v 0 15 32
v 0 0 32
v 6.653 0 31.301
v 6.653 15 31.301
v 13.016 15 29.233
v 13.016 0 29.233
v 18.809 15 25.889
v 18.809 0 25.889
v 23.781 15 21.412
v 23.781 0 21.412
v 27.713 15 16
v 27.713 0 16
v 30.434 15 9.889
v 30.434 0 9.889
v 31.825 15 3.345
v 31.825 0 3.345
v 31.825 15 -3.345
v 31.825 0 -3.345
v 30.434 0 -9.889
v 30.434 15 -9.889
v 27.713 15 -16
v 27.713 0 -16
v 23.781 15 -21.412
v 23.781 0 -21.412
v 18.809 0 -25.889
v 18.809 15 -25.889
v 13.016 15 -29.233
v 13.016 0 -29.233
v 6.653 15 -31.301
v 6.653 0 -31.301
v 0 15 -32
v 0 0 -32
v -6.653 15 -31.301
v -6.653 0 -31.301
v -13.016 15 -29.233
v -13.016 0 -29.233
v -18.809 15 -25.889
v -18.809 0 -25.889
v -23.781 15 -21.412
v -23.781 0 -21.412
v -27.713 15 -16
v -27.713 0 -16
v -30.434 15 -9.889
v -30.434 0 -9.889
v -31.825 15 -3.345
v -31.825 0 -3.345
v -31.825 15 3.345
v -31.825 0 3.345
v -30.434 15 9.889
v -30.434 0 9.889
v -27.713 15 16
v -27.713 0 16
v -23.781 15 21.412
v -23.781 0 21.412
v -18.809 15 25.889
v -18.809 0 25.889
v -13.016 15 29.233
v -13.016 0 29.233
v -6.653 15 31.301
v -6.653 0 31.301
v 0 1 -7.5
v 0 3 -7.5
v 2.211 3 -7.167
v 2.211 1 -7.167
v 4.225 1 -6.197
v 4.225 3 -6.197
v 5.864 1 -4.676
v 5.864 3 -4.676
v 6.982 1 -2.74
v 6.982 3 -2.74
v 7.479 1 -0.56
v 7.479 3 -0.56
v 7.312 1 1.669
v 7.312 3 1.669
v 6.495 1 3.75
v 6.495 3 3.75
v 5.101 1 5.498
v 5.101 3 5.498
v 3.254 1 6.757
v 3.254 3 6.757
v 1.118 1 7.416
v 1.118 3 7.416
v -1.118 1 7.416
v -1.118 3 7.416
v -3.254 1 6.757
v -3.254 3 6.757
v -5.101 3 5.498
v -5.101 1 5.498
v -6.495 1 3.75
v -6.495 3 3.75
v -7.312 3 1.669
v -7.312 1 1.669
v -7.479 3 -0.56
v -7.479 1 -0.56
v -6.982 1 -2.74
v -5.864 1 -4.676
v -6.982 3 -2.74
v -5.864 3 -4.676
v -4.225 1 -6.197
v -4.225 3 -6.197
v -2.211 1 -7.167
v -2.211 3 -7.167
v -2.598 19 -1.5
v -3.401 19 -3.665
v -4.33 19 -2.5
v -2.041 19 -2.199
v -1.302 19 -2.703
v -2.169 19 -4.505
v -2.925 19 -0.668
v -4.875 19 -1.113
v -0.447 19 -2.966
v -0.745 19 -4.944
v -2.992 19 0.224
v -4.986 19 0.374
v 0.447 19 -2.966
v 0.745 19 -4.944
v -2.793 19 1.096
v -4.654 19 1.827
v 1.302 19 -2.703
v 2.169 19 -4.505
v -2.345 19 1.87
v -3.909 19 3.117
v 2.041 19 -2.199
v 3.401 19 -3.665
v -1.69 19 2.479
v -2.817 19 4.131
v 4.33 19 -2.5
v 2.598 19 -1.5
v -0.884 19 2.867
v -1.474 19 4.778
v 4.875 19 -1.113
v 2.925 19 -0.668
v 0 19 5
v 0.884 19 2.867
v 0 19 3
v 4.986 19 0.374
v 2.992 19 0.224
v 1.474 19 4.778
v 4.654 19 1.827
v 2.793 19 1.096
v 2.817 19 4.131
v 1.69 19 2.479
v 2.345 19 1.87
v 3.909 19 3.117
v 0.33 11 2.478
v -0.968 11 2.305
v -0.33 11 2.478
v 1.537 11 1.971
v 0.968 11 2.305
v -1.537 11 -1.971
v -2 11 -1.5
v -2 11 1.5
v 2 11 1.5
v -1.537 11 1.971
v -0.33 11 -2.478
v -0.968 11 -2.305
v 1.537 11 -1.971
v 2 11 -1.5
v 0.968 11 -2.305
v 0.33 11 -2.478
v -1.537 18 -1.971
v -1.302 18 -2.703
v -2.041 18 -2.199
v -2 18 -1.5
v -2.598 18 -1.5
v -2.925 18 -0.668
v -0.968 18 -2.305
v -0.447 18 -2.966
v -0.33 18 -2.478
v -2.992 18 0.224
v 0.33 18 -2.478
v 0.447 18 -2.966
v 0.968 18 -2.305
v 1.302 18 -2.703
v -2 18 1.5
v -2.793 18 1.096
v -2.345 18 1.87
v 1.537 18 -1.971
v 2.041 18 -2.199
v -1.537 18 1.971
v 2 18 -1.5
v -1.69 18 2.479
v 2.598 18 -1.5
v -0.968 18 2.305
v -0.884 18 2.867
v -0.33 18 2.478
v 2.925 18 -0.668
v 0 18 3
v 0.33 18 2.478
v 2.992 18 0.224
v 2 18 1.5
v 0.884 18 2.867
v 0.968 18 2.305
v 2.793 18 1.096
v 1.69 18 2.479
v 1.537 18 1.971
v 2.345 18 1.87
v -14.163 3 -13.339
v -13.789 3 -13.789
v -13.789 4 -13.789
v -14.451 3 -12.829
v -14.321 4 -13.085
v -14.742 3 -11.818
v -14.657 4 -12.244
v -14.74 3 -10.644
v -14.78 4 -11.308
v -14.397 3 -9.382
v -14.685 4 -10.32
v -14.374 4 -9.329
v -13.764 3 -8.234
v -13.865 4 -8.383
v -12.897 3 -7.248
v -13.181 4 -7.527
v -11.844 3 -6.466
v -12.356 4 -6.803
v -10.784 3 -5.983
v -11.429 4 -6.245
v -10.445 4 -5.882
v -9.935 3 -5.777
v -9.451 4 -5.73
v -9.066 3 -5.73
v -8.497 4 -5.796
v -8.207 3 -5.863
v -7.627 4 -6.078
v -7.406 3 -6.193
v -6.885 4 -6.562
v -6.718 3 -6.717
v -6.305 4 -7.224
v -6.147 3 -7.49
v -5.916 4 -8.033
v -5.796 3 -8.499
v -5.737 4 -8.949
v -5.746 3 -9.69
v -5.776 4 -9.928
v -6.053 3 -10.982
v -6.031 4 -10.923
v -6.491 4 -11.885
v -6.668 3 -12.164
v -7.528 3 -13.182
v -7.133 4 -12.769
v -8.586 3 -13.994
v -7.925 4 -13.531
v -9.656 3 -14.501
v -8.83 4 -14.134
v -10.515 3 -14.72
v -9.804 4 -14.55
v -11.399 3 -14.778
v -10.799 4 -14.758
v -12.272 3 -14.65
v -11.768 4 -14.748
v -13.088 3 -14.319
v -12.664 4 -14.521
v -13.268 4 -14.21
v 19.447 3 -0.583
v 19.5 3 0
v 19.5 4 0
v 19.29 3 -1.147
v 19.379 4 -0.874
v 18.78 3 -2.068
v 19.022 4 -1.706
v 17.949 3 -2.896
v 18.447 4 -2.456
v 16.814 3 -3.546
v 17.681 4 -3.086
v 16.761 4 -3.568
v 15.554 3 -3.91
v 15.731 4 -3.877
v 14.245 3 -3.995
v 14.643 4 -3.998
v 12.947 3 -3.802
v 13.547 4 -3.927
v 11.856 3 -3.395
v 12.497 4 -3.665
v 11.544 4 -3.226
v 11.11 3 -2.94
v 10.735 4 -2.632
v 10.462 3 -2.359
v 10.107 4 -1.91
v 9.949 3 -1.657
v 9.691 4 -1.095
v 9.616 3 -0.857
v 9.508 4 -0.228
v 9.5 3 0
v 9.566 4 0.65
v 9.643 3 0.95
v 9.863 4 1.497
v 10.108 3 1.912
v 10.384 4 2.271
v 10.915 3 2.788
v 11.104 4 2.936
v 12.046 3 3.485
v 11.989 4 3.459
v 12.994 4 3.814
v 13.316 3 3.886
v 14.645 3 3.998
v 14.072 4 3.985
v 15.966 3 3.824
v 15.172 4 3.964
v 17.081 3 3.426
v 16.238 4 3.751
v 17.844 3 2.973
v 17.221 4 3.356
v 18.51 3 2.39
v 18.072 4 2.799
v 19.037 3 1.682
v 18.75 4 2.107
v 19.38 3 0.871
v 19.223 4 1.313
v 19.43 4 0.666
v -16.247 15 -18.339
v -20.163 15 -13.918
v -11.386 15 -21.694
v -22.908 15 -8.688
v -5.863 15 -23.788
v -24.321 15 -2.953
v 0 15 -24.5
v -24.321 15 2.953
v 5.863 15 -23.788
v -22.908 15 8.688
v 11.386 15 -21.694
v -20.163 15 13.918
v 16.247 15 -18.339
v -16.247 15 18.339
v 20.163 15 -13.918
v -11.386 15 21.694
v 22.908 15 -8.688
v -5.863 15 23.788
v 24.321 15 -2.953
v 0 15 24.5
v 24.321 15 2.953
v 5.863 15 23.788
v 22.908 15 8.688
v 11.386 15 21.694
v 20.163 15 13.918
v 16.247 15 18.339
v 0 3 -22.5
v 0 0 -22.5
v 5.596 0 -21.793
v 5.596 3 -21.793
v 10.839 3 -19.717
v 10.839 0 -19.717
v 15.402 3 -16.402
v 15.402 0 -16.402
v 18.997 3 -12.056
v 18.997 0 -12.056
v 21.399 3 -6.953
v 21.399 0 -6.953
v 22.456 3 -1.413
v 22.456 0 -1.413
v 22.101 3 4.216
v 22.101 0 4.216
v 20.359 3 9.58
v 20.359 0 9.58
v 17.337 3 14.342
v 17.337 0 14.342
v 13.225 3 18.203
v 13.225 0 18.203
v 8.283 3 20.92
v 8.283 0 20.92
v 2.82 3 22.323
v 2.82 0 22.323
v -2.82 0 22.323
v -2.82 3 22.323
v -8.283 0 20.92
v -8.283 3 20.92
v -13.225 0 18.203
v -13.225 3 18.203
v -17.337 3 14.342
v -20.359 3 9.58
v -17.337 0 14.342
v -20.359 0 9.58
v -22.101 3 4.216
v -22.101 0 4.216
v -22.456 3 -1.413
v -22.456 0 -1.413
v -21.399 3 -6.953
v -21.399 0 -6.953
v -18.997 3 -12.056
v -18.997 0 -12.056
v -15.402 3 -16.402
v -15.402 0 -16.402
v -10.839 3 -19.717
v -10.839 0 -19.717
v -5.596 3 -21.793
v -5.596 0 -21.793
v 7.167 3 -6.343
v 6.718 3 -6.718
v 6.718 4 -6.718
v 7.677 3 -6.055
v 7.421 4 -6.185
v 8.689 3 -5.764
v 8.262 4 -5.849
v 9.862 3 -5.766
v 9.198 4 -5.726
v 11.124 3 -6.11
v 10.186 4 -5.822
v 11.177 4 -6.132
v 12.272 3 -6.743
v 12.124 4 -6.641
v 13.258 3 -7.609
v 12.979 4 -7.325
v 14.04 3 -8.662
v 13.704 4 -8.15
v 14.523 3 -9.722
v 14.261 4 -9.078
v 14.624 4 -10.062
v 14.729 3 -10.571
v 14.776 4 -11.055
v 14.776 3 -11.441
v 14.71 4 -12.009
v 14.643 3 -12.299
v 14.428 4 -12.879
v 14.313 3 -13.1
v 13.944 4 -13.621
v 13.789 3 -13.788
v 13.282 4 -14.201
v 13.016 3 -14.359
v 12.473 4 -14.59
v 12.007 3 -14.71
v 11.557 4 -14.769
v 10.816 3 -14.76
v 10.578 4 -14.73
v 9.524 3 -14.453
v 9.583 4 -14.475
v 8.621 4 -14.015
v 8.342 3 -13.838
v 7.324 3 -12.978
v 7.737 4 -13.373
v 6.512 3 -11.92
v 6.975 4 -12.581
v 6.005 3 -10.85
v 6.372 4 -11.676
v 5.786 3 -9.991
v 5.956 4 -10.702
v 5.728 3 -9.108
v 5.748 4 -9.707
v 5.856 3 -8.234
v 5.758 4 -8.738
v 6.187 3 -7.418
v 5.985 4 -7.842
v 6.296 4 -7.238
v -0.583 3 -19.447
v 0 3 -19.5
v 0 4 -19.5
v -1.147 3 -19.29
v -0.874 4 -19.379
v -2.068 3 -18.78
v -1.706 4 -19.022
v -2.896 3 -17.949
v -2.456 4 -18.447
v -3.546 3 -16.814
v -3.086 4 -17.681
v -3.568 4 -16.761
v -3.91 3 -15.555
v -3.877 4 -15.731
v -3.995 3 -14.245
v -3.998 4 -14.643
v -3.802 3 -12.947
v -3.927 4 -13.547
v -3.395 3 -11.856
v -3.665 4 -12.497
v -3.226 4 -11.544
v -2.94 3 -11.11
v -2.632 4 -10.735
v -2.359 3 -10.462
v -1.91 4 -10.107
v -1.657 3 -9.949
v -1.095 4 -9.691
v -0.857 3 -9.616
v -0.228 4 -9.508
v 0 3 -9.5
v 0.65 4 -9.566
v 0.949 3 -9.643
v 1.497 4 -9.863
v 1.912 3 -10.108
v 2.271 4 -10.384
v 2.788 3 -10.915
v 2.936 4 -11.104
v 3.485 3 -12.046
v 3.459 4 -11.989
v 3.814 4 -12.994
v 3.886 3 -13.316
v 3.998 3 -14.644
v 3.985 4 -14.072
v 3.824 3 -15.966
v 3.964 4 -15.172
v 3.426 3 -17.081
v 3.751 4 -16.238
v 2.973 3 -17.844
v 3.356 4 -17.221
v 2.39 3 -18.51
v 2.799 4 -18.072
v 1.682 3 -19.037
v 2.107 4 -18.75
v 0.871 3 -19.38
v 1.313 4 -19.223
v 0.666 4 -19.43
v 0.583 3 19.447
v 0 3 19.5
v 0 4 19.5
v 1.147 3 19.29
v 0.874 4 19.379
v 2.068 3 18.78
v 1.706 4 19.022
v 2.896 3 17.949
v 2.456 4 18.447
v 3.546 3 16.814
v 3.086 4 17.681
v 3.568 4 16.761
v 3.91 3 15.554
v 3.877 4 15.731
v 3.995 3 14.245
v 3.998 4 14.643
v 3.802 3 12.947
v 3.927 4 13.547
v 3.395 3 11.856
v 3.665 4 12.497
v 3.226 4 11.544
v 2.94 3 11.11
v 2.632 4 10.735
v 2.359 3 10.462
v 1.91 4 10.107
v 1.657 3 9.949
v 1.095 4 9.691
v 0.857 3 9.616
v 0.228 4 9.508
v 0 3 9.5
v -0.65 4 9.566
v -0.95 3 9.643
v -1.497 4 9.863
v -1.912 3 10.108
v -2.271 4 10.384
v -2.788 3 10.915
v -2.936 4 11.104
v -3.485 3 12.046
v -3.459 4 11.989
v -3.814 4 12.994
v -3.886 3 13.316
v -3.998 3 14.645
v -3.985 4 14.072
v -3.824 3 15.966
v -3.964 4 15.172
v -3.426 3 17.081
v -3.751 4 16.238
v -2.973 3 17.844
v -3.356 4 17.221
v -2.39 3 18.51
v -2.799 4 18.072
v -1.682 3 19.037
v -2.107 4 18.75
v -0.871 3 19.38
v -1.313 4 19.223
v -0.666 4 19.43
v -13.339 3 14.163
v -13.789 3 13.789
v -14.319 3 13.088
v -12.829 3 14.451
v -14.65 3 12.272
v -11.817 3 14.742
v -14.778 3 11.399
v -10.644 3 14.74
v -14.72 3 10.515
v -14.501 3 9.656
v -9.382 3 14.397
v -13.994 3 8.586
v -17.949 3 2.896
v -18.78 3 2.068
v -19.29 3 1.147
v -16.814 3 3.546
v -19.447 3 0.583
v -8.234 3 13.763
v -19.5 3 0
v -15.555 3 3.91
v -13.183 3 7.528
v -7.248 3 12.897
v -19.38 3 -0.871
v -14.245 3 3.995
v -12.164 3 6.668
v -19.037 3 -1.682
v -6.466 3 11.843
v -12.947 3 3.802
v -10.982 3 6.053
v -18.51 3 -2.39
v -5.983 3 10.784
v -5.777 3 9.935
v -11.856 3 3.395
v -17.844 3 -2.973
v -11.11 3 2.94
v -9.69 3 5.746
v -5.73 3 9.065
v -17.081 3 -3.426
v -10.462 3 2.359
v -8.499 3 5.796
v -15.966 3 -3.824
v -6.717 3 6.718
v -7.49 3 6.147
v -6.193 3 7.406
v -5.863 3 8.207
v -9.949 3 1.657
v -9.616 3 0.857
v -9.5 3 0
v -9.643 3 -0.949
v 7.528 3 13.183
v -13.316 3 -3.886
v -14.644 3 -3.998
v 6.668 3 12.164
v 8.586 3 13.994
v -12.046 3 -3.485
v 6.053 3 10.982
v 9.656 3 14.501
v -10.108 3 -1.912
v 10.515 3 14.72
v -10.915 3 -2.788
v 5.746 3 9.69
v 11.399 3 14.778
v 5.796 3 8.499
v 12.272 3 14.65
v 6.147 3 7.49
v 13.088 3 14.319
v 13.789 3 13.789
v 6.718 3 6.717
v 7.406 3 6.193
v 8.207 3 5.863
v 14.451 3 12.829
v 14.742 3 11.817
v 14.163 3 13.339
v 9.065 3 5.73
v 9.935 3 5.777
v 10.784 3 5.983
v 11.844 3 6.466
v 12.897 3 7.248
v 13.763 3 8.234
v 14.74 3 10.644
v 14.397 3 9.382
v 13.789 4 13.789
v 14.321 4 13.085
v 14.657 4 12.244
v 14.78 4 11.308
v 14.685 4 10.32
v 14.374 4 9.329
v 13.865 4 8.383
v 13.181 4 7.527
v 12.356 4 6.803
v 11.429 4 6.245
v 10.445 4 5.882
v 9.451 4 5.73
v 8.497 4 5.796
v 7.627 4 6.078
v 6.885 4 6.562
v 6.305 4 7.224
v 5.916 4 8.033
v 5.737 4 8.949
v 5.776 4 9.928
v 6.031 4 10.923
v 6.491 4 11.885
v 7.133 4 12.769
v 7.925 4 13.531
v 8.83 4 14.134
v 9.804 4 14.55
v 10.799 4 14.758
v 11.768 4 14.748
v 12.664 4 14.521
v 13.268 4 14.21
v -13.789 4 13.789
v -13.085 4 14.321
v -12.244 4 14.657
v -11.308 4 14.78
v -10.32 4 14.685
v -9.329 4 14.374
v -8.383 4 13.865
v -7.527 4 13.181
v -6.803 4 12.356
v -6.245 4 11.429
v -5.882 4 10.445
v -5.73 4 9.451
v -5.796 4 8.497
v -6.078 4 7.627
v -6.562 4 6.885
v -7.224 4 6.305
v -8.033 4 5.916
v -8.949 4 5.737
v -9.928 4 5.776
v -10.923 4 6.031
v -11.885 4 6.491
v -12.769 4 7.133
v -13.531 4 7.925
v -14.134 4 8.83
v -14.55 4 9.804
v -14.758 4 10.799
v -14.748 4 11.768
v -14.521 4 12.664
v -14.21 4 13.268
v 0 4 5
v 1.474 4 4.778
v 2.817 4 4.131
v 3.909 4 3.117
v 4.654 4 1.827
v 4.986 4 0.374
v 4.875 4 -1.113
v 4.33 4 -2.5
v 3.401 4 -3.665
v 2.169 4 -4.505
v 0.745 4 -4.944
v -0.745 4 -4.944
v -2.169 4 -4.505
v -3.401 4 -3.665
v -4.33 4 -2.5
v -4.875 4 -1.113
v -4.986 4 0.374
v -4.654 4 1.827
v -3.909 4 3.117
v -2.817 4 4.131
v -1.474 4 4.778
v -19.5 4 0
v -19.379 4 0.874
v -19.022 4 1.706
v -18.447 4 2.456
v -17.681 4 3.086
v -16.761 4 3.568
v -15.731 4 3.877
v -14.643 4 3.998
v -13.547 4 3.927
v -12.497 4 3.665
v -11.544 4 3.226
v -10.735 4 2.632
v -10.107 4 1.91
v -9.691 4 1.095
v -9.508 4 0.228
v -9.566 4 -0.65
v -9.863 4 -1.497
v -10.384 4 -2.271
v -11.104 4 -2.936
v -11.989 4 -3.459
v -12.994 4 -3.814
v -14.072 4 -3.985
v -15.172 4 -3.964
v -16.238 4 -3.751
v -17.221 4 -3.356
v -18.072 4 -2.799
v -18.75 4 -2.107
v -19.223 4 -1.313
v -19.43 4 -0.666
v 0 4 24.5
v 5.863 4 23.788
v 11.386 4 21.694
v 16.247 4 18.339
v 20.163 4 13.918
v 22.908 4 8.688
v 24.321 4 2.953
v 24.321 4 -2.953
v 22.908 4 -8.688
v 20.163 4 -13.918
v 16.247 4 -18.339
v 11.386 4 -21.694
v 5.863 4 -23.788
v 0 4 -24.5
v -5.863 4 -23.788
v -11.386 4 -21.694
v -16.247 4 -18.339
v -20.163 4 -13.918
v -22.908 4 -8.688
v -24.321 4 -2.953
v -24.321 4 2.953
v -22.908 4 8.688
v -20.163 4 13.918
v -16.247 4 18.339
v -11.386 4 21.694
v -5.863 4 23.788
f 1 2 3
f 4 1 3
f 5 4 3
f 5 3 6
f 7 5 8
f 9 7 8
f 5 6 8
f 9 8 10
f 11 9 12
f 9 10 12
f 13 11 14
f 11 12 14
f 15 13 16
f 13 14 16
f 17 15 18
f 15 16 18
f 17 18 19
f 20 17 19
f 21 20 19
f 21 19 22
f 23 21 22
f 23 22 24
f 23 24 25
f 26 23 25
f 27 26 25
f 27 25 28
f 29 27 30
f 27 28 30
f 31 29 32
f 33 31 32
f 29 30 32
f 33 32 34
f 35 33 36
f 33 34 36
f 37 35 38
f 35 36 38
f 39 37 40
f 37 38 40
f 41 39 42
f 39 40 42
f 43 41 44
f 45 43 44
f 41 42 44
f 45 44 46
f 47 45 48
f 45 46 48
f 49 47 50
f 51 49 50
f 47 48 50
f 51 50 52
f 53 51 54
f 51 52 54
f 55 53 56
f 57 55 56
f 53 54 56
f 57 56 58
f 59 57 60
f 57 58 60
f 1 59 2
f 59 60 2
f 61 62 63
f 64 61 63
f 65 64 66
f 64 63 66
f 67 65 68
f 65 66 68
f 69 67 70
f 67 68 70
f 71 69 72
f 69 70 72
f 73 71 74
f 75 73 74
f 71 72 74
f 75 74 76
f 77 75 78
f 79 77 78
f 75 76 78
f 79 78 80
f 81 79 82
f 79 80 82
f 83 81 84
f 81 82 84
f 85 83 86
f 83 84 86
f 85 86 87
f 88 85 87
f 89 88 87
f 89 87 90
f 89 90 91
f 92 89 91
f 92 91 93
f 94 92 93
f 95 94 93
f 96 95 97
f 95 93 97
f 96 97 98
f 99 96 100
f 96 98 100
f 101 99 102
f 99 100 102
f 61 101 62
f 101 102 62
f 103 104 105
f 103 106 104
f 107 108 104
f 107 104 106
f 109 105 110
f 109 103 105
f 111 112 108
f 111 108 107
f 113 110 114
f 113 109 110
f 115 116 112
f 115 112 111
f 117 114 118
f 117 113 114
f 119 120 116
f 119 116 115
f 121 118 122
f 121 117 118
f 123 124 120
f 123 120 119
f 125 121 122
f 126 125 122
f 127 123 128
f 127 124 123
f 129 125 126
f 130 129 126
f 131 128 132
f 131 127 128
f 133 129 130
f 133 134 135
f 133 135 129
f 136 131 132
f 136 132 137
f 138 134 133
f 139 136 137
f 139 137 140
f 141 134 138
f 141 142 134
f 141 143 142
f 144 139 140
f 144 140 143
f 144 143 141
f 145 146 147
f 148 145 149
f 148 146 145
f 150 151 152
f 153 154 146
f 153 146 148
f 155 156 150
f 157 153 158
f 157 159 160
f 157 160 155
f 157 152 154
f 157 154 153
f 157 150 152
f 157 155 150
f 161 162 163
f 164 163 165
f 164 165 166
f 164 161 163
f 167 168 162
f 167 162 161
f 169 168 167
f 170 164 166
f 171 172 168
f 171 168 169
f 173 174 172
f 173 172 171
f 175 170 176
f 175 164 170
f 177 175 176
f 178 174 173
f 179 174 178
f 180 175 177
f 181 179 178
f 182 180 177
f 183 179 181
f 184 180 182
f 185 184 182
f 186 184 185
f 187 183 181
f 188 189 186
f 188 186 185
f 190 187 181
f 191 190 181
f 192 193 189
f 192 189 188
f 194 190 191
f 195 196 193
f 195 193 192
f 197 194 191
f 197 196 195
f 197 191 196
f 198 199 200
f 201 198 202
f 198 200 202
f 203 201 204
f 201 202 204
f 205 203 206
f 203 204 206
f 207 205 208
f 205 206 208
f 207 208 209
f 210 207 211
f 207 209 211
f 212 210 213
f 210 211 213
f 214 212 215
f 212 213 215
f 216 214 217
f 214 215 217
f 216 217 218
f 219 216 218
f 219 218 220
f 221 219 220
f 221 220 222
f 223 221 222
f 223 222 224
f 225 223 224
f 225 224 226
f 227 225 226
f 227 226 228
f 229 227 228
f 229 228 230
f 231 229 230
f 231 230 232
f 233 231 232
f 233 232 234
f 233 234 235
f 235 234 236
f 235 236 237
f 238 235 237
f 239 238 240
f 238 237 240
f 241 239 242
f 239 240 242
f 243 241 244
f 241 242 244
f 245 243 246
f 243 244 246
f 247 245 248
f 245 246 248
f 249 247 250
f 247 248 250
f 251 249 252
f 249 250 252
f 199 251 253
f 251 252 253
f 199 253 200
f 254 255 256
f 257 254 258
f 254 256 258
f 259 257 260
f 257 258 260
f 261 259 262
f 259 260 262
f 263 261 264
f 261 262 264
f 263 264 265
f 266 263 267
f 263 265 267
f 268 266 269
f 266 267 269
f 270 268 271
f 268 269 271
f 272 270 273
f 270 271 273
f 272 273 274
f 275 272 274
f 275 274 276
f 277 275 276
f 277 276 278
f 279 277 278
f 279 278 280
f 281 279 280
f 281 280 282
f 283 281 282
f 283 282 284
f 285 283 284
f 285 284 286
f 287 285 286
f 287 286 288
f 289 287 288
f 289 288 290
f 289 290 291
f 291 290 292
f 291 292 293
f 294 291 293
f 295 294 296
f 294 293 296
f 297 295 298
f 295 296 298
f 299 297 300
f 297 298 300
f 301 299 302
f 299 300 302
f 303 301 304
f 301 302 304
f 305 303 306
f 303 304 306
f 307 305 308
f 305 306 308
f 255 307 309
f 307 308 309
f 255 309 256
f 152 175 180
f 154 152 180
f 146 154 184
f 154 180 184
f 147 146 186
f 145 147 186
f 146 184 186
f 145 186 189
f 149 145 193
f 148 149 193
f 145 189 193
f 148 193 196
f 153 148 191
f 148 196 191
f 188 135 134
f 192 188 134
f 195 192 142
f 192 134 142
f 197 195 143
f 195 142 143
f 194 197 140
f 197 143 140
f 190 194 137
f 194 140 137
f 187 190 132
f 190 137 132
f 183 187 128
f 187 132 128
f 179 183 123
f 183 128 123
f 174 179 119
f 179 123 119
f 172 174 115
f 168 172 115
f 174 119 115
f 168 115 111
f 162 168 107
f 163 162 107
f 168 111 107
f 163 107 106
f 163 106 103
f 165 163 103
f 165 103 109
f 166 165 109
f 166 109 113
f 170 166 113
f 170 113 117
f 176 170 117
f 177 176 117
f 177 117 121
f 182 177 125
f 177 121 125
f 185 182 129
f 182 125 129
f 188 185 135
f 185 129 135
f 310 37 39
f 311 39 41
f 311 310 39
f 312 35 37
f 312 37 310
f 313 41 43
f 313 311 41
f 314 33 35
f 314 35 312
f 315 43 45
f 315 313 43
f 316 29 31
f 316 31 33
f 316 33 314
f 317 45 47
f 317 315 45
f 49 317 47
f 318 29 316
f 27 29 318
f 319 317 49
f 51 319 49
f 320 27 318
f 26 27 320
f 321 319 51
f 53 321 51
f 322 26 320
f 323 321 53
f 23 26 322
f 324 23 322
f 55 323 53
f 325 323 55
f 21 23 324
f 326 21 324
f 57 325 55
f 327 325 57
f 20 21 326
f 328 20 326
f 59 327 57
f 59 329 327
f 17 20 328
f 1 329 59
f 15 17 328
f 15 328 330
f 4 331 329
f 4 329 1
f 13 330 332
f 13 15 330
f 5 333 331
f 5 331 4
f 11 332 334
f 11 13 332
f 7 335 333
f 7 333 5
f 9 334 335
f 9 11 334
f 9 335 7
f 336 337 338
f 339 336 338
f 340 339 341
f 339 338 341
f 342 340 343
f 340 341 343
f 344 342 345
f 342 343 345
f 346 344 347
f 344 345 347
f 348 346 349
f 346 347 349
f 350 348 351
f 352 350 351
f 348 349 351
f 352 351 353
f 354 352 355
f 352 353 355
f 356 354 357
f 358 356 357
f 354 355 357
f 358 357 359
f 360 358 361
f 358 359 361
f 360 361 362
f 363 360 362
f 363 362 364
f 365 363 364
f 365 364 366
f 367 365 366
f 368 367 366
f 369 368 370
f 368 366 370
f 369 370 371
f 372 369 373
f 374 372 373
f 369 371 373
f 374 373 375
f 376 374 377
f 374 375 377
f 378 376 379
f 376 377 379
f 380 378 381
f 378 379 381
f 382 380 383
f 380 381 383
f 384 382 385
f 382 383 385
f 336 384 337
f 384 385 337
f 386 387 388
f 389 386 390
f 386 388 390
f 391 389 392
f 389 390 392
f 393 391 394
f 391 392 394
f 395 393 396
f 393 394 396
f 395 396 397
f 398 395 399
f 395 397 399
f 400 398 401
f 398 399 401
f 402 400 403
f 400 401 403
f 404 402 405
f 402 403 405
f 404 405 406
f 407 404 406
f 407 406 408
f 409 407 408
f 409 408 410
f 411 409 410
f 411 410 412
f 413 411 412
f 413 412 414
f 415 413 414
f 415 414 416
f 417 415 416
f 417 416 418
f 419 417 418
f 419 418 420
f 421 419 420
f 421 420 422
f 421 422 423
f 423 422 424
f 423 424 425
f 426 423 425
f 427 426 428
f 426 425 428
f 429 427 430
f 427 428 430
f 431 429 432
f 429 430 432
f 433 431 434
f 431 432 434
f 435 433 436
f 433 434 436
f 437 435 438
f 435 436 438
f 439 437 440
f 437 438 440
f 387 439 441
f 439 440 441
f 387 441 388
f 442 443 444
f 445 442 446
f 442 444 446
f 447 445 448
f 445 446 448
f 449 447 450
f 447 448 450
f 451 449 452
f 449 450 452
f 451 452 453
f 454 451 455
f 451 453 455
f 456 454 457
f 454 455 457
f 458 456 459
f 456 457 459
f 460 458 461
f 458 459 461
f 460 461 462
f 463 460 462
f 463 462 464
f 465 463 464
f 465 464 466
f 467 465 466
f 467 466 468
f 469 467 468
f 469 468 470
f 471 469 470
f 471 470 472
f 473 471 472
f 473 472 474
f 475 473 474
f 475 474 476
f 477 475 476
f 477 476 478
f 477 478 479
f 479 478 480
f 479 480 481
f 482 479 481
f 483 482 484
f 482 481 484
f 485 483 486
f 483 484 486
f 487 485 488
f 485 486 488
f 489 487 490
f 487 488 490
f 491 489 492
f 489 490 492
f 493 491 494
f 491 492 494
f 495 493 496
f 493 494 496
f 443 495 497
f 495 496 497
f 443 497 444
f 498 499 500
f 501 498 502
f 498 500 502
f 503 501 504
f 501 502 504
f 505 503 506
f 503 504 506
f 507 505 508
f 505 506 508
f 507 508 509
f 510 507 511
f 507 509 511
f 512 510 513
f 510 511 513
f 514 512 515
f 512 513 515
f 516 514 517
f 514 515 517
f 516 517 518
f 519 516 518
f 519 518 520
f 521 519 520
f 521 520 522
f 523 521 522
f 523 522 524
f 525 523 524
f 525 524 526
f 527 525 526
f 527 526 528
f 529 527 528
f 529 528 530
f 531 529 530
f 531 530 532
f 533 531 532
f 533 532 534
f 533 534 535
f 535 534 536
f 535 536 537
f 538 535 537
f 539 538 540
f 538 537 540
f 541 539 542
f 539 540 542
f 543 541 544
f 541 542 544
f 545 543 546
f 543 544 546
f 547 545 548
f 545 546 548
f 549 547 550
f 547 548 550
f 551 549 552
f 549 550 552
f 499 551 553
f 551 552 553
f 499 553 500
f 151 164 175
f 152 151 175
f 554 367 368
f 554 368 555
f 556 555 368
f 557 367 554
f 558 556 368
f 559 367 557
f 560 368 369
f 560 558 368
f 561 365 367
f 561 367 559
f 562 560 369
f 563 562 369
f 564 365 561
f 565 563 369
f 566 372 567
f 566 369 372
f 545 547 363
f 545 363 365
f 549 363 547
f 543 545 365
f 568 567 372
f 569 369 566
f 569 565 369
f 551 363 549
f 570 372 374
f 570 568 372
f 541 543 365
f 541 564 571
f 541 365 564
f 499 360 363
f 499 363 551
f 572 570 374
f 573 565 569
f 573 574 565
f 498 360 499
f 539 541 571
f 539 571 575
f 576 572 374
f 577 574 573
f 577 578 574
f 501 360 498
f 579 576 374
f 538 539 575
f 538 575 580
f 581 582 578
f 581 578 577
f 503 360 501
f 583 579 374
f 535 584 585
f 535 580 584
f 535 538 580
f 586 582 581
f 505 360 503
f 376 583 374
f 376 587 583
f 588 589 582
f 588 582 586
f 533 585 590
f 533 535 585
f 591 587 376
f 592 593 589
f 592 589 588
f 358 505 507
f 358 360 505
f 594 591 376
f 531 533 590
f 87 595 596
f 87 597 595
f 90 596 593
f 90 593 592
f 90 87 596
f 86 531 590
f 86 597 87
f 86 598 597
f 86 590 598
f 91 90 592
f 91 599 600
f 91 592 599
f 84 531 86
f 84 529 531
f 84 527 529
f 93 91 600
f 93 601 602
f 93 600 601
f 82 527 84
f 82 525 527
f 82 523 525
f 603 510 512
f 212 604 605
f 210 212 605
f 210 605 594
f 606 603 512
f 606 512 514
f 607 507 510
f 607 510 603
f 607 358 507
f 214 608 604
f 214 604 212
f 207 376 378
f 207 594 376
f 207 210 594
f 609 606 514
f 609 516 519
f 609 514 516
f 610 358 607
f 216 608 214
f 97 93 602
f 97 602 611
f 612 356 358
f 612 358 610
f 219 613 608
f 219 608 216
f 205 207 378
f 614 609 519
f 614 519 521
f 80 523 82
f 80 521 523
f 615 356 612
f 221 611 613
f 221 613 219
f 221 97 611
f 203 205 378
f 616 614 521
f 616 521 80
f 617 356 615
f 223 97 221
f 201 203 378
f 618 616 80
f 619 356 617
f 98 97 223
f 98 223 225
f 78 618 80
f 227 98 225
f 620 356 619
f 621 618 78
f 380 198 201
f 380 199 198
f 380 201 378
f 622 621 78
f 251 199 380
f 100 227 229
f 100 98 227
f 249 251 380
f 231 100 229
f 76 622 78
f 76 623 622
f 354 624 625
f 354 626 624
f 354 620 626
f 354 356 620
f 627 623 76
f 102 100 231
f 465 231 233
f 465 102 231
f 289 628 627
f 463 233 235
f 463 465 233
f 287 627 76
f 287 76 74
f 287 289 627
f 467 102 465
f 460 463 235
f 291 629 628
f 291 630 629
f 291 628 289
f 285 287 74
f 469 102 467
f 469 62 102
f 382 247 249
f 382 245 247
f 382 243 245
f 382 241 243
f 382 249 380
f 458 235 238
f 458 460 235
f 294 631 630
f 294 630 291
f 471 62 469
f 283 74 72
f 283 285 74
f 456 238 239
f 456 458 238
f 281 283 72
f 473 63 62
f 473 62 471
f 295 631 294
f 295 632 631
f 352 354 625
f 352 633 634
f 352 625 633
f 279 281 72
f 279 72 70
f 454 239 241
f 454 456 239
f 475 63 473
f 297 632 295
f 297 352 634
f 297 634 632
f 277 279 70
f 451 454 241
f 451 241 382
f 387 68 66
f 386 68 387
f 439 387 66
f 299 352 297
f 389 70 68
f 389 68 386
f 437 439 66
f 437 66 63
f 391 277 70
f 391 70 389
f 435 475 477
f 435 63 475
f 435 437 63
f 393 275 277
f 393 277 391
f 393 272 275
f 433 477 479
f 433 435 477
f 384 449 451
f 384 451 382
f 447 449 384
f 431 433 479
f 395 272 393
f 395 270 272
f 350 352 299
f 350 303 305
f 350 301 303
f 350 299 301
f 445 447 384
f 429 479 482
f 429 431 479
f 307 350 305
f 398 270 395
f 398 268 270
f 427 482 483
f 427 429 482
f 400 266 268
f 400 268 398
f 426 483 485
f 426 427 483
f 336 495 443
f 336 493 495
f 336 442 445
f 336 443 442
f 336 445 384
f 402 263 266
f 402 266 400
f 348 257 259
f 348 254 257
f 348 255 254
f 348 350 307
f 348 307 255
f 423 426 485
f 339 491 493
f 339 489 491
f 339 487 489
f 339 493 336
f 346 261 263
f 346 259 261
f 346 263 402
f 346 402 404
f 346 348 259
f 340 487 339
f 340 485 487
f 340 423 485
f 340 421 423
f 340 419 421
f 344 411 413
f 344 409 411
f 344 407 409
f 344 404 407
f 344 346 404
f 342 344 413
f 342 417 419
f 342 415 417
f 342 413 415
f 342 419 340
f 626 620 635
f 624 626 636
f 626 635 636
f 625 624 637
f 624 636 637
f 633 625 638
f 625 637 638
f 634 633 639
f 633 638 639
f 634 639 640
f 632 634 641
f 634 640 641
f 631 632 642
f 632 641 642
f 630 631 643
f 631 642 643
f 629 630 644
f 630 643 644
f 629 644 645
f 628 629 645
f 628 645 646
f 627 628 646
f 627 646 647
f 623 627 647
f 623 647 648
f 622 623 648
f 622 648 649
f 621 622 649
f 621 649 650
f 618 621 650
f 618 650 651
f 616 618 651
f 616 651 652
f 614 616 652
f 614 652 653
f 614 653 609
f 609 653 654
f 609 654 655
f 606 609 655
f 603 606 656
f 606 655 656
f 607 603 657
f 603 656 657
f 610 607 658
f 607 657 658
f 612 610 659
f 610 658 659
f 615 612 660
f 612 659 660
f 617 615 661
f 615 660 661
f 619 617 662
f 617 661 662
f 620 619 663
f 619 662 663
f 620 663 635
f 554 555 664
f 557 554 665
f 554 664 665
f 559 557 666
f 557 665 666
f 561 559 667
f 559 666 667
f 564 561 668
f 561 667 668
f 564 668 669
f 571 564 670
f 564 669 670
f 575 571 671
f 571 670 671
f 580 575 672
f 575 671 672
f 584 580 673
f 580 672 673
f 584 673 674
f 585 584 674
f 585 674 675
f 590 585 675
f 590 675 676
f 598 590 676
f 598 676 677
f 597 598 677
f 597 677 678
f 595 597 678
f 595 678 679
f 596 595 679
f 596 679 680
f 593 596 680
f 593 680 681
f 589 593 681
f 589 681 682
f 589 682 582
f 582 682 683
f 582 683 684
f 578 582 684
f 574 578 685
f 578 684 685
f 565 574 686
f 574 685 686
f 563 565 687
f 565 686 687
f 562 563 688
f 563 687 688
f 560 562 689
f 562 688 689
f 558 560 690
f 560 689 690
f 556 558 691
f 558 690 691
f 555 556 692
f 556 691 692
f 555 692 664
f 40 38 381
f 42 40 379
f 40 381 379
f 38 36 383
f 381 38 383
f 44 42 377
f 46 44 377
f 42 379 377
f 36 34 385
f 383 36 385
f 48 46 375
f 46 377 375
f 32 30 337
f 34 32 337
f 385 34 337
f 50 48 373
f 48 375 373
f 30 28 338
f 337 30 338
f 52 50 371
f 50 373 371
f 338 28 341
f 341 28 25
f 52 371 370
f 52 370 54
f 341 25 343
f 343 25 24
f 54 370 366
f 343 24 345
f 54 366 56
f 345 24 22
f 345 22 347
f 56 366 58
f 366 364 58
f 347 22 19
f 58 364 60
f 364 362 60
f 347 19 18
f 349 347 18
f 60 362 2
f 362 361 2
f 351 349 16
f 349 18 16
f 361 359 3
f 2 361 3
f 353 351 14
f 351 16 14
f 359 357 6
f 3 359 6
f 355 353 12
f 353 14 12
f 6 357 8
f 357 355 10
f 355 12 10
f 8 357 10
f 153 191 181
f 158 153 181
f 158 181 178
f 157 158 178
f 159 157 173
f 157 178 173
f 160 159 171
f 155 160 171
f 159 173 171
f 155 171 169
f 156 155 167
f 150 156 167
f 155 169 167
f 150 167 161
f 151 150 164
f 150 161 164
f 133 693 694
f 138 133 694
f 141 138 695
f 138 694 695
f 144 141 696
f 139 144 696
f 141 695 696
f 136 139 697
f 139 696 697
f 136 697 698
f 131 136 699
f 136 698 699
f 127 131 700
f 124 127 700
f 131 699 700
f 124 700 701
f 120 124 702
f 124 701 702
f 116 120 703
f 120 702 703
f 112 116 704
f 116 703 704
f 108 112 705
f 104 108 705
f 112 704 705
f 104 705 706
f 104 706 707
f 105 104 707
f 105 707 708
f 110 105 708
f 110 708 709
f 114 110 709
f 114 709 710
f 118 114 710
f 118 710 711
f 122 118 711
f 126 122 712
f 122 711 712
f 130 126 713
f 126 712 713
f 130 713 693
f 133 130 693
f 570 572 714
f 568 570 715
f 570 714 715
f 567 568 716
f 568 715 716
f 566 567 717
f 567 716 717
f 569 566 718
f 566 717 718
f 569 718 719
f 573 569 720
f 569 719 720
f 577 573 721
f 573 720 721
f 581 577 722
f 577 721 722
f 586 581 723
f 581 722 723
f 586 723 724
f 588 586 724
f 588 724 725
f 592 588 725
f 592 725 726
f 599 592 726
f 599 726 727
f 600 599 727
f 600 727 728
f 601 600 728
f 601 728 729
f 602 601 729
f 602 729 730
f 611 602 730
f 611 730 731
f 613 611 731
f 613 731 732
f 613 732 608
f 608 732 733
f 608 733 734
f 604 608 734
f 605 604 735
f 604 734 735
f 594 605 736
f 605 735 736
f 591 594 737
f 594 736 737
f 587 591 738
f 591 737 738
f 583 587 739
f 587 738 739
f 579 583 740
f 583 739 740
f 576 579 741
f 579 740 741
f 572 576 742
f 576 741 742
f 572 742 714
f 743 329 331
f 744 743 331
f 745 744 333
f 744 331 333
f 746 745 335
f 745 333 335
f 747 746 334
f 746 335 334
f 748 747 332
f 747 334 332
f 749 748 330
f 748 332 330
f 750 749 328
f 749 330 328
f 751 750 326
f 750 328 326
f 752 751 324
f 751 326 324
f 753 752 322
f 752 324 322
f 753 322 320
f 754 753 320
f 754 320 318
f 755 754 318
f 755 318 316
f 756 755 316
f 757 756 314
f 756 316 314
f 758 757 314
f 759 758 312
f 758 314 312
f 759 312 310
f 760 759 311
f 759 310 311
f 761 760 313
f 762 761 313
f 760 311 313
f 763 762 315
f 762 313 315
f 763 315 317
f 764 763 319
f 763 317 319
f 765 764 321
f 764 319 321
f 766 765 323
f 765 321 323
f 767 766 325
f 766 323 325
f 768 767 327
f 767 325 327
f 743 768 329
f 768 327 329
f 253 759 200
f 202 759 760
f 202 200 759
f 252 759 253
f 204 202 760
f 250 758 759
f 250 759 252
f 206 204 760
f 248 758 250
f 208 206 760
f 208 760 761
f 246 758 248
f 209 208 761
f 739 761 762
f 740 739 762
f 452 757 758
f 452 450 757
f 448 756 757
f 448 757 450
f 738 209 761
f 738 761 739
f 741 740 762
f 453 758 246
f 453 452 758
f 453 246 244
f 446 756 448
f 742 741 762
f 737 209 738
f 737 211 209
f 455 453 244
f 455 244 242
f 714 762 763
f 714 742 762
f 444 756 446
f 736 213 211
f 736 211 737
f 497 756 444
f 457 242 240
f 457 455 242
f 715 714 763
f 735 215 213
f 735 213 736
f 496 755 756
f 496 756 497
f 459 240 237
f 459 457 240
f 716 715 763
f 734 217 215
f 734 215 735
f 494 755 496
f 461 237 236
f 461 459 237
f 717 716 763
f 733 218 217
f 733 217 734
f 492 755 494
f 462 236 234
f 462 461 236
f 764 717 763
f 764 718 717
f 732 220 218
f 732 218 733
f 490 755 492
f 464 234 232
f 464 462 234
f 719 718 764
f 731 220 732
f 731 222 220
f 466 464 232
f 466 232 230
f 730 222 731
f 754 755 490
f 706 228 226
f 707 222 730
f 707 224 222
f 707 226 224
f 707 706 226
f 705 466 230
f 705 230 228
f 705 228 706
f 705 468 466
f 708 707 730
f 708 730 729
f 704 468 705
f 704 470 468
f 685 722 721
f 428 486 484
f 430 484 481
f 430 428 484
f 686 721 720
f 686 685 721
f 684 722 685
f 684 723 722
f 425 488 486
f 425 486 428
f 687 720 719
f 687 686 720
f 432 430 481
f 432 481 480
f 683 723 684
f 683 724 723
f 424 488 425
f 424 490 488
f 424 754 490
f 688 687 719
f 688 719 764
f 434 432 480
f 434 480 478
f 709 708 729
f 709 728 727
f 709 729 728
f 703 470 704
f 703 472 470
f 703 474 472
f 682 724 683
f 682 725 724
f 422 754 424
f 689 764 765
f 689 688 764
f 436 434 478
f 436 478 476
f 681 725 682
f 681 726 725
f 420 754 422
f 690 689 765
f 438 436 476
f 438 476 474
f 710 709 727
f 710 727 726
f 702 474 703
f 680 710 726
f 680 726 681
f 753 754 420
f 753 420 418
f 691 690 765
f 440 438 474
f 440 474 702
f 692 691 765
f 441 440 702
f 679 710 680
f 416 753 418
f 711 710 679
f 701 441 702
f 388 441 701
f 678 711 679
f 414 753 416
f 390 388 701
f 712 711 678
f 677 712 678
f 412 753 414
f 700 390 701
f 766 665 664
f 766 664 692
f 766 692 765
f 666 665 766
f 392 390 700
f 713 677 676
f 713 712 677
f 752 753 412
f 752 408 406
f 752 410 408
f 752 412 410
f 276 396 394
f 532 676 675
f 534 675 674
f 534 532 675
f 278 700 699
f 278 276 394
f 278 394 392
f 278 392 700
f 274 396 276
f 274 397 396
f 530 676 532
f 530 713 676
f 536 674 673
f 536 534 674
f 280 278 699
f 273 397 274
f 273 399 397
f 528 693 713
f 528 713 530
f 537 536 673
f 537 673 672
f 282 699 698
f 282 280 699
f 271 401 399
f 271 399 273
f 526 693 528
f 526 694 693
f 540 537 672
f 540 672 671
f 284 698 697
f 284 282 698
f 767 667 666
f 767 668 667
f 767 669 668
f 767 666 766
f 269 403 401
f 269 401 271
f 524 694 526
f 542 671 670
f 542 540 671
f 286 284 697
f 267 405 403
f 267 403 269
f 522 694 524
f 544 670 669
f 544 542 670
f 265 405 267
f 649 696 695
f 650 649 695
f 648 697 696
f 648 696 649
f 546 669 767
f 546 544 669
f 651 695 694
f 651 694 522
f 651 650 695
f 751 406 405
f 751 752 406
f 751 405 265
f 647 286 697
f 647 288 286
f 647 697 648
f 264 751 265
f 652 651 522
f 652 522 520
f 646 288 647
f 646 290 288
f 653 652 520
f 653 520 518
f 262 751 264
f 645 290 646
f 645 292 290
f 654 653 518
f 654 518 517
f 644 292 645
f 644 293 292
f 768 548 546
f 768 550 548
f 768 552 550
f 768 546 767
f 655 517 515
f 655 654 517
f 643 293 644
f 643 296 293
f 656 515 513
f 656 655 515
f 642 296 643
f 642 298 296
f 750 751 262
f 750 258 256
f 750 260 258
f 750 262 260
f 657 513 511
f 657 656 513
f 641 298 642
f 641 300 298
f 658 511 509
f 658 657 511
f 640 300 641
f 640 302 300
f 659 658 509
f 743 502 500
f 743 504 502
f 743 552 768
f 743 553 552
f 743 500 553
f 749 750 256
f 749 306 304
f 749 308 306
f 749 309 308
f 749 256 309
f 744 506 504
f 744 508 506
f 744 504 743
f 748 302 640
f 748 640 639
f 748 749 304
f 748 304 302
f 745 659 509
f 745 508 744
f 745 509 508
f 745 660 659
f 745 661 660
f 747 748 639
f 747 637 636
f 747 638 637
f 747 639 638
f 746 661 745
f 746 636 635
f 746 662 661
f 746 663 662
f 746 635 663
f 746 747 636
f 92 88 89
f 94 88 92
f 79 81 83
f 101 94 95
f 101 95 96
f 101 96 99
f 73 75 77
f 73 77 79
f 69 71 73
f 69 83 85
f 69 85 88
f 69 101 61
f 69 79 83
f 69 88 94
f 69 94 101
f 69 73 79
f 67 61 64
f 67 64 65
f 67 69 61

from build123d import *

# Parameters (mm, degrees)
SKETCH1_R           = 32
BOSS_EXTRUDE1_DEPTH = 15
SKETCH2_R           = 22.5
CUT_EXTRUDE1_DEPTH  = 3
SKETCH3_R           = 7.5
BOSS_EXTRUDE2_DEPTH = 2
SKETCH4_R           = 24.5
CUT_EXTRUDE2_DEPTH  = 11
SKETCH5_R           = 5
BOSS_EXTRUDE3_DEPTH = 15
SKETCH6_RX          = 5
SKETCH6_RY          = 4
CUT_EXTRUDE3_DEPTH  = 48.675989764
SKETCH7_R           = 3
CUT_EXTRUDE4_DEPTH  = 1
CUT_EXTRUDE5_DEPTH  = 7


with BuildPart() as part:
    # Sketch1 → Boss-Extrude1 (new body)
    with BuildSketch(Plane(origin=(0, 0, 0), x_dir=(1, 0, 0), z_dir=(0, 1, 0))):
        with Locations(Location((0, 0, 0), (0, 0, 270))):
            Circle(SKETCH1_R)
    extrude(amount=BOSS_EXTRUDE1_DEPTH)

    # Sketch2 → Cut-Extrude1 (cut)
    with BuildSketch(Plane.XZ):
        with Locations(Location((0, 0, 0), (0, 0, 270))):
            Circle(SKETCH2_R)
    extrude(amount=-CUT_EXTRUDE1_DEPTH, mode=Mode.SUBTRACT)

    # Sketch3 → Boss-Extrude2 (add)
    with BuildSketch(Plane.XZ.offset(-3)):
        with Locations(Location((0, 0, 0), (0, 0, 270))):
            Circle(SKETCH3_R)
    extrude(amount=BOSS_EXTRUDE2_DEPTH)

    # Sketch4 → Cut-Extrude2 (cut)
    with BuildSketch(Plane(origin=(0, 15, 0), x_dir=(1, 0, 0), z_dir=(0, 1, 0))):
        with Locations(Location((0, 0, 0), (0, 0, 270))):
            Circle(SKETCH4_R)
    extrude(amount=-CUT_EXTRUDE2_DEPTH, mode=Mode.SUBTRACT)

    # Sketch5 → Boss-Extrude3 (add)
    with BuildSketch(Plane(origin=(0, 4, 0), x_dir=(1, 0, 0), z_dir=(0, 1, 0))):
        with Locations(Location((0, 0, 0), (0, 0, 270))):
            Circle(SKETCH5_R)
    extrude(amount=BOSS_EXTRUDE3_DEPTH)

    # Sketch6 → Cut-Extrude3 (cut, through all)
    with BuildSketch(Plane(origin=(0, 4, 0), x_dir=(1, 0, 0), z_dir=(0, 1, 0))):
        with Locations(Location((0, -14.5), (0, 0, -90))):
            Ellipse(SKETCH6_RX, SKETCH6_RY)
        with Locations(Location((-10.253048327, -10.253048327), (0, 0, -135))):
            Ellipse(SKETCH6_RX, SKETCH6_RY)
        with Locations(Location((-14.5, 0), (0, 0, 180))):
            Ellipse(SKETCH6_RX, SKETCH6_RY)
        with Locations(Location((-10.253048327, 10.253048327), (0, 0, 135))):
            Ellipse(SKETCH6_RX, SKETCH6_RY)
        with Locations(Location((0, 14.5), (0, 0, 90))):
            Ellipse(SKETCH6_RX, SKETCH6_RY)
        with Locations(Location((10.253048327, 10.253048327), (0, 0, -135))):
            Ellipse(SKETCH6_RX, SKETCH6_RY)
        with Locations(Location((14.5, 0), (0, 0, 0))):
            Ellipse(SKETCH6_RX, SKETCH6_RY)
        with Locations(Location((10.253048327, -10.253048327), (0, 0, -45))):
            Ellipse(SKETCH6_RX, SKETCH6_RY)
    extrude(amount=-CUT_EXTRUDE3_DEPTH, mode=Mode.SUBTRACT)

    # Sketch7 → Cut-Extrude4 (cut)
    with BuildSketch(Plane(origin=(0, 19, 0), x_dir=(1, 0, 0), z_dir=(0, 1, 0))):
        with Locations(Location((0, 0, 0), (0, 0, 270))):
            Circle(SKETCH7_R)
    extrude(amount=-CUT_EXTRUDE4_DEPTH, mode=Mode.SUBTRACT)

    # Sketch8 → Cut-Extrude5 (cut)
    with BuildSketch(Plane(origin=(0, 18, 0), x_dir=(1, 0, 0), z_dir=(0, 1, 0))):
        with BuildLine():
            Line((2, -1.5), (2, 1.5))
            ThreePointArc((2, 1.5), (0, 2.5), (-2, 1.5))
            Line((-2, 1.5), (-2, -1.5))
            ThreePointArc((-2, -1.5), (0, -2.5), (2, -1.5))
        make_face()
    extrude(amount=-CUT_EXTRUDE5_DEPTH, mode=Mode.SUBTRACT)


solid = part.part
